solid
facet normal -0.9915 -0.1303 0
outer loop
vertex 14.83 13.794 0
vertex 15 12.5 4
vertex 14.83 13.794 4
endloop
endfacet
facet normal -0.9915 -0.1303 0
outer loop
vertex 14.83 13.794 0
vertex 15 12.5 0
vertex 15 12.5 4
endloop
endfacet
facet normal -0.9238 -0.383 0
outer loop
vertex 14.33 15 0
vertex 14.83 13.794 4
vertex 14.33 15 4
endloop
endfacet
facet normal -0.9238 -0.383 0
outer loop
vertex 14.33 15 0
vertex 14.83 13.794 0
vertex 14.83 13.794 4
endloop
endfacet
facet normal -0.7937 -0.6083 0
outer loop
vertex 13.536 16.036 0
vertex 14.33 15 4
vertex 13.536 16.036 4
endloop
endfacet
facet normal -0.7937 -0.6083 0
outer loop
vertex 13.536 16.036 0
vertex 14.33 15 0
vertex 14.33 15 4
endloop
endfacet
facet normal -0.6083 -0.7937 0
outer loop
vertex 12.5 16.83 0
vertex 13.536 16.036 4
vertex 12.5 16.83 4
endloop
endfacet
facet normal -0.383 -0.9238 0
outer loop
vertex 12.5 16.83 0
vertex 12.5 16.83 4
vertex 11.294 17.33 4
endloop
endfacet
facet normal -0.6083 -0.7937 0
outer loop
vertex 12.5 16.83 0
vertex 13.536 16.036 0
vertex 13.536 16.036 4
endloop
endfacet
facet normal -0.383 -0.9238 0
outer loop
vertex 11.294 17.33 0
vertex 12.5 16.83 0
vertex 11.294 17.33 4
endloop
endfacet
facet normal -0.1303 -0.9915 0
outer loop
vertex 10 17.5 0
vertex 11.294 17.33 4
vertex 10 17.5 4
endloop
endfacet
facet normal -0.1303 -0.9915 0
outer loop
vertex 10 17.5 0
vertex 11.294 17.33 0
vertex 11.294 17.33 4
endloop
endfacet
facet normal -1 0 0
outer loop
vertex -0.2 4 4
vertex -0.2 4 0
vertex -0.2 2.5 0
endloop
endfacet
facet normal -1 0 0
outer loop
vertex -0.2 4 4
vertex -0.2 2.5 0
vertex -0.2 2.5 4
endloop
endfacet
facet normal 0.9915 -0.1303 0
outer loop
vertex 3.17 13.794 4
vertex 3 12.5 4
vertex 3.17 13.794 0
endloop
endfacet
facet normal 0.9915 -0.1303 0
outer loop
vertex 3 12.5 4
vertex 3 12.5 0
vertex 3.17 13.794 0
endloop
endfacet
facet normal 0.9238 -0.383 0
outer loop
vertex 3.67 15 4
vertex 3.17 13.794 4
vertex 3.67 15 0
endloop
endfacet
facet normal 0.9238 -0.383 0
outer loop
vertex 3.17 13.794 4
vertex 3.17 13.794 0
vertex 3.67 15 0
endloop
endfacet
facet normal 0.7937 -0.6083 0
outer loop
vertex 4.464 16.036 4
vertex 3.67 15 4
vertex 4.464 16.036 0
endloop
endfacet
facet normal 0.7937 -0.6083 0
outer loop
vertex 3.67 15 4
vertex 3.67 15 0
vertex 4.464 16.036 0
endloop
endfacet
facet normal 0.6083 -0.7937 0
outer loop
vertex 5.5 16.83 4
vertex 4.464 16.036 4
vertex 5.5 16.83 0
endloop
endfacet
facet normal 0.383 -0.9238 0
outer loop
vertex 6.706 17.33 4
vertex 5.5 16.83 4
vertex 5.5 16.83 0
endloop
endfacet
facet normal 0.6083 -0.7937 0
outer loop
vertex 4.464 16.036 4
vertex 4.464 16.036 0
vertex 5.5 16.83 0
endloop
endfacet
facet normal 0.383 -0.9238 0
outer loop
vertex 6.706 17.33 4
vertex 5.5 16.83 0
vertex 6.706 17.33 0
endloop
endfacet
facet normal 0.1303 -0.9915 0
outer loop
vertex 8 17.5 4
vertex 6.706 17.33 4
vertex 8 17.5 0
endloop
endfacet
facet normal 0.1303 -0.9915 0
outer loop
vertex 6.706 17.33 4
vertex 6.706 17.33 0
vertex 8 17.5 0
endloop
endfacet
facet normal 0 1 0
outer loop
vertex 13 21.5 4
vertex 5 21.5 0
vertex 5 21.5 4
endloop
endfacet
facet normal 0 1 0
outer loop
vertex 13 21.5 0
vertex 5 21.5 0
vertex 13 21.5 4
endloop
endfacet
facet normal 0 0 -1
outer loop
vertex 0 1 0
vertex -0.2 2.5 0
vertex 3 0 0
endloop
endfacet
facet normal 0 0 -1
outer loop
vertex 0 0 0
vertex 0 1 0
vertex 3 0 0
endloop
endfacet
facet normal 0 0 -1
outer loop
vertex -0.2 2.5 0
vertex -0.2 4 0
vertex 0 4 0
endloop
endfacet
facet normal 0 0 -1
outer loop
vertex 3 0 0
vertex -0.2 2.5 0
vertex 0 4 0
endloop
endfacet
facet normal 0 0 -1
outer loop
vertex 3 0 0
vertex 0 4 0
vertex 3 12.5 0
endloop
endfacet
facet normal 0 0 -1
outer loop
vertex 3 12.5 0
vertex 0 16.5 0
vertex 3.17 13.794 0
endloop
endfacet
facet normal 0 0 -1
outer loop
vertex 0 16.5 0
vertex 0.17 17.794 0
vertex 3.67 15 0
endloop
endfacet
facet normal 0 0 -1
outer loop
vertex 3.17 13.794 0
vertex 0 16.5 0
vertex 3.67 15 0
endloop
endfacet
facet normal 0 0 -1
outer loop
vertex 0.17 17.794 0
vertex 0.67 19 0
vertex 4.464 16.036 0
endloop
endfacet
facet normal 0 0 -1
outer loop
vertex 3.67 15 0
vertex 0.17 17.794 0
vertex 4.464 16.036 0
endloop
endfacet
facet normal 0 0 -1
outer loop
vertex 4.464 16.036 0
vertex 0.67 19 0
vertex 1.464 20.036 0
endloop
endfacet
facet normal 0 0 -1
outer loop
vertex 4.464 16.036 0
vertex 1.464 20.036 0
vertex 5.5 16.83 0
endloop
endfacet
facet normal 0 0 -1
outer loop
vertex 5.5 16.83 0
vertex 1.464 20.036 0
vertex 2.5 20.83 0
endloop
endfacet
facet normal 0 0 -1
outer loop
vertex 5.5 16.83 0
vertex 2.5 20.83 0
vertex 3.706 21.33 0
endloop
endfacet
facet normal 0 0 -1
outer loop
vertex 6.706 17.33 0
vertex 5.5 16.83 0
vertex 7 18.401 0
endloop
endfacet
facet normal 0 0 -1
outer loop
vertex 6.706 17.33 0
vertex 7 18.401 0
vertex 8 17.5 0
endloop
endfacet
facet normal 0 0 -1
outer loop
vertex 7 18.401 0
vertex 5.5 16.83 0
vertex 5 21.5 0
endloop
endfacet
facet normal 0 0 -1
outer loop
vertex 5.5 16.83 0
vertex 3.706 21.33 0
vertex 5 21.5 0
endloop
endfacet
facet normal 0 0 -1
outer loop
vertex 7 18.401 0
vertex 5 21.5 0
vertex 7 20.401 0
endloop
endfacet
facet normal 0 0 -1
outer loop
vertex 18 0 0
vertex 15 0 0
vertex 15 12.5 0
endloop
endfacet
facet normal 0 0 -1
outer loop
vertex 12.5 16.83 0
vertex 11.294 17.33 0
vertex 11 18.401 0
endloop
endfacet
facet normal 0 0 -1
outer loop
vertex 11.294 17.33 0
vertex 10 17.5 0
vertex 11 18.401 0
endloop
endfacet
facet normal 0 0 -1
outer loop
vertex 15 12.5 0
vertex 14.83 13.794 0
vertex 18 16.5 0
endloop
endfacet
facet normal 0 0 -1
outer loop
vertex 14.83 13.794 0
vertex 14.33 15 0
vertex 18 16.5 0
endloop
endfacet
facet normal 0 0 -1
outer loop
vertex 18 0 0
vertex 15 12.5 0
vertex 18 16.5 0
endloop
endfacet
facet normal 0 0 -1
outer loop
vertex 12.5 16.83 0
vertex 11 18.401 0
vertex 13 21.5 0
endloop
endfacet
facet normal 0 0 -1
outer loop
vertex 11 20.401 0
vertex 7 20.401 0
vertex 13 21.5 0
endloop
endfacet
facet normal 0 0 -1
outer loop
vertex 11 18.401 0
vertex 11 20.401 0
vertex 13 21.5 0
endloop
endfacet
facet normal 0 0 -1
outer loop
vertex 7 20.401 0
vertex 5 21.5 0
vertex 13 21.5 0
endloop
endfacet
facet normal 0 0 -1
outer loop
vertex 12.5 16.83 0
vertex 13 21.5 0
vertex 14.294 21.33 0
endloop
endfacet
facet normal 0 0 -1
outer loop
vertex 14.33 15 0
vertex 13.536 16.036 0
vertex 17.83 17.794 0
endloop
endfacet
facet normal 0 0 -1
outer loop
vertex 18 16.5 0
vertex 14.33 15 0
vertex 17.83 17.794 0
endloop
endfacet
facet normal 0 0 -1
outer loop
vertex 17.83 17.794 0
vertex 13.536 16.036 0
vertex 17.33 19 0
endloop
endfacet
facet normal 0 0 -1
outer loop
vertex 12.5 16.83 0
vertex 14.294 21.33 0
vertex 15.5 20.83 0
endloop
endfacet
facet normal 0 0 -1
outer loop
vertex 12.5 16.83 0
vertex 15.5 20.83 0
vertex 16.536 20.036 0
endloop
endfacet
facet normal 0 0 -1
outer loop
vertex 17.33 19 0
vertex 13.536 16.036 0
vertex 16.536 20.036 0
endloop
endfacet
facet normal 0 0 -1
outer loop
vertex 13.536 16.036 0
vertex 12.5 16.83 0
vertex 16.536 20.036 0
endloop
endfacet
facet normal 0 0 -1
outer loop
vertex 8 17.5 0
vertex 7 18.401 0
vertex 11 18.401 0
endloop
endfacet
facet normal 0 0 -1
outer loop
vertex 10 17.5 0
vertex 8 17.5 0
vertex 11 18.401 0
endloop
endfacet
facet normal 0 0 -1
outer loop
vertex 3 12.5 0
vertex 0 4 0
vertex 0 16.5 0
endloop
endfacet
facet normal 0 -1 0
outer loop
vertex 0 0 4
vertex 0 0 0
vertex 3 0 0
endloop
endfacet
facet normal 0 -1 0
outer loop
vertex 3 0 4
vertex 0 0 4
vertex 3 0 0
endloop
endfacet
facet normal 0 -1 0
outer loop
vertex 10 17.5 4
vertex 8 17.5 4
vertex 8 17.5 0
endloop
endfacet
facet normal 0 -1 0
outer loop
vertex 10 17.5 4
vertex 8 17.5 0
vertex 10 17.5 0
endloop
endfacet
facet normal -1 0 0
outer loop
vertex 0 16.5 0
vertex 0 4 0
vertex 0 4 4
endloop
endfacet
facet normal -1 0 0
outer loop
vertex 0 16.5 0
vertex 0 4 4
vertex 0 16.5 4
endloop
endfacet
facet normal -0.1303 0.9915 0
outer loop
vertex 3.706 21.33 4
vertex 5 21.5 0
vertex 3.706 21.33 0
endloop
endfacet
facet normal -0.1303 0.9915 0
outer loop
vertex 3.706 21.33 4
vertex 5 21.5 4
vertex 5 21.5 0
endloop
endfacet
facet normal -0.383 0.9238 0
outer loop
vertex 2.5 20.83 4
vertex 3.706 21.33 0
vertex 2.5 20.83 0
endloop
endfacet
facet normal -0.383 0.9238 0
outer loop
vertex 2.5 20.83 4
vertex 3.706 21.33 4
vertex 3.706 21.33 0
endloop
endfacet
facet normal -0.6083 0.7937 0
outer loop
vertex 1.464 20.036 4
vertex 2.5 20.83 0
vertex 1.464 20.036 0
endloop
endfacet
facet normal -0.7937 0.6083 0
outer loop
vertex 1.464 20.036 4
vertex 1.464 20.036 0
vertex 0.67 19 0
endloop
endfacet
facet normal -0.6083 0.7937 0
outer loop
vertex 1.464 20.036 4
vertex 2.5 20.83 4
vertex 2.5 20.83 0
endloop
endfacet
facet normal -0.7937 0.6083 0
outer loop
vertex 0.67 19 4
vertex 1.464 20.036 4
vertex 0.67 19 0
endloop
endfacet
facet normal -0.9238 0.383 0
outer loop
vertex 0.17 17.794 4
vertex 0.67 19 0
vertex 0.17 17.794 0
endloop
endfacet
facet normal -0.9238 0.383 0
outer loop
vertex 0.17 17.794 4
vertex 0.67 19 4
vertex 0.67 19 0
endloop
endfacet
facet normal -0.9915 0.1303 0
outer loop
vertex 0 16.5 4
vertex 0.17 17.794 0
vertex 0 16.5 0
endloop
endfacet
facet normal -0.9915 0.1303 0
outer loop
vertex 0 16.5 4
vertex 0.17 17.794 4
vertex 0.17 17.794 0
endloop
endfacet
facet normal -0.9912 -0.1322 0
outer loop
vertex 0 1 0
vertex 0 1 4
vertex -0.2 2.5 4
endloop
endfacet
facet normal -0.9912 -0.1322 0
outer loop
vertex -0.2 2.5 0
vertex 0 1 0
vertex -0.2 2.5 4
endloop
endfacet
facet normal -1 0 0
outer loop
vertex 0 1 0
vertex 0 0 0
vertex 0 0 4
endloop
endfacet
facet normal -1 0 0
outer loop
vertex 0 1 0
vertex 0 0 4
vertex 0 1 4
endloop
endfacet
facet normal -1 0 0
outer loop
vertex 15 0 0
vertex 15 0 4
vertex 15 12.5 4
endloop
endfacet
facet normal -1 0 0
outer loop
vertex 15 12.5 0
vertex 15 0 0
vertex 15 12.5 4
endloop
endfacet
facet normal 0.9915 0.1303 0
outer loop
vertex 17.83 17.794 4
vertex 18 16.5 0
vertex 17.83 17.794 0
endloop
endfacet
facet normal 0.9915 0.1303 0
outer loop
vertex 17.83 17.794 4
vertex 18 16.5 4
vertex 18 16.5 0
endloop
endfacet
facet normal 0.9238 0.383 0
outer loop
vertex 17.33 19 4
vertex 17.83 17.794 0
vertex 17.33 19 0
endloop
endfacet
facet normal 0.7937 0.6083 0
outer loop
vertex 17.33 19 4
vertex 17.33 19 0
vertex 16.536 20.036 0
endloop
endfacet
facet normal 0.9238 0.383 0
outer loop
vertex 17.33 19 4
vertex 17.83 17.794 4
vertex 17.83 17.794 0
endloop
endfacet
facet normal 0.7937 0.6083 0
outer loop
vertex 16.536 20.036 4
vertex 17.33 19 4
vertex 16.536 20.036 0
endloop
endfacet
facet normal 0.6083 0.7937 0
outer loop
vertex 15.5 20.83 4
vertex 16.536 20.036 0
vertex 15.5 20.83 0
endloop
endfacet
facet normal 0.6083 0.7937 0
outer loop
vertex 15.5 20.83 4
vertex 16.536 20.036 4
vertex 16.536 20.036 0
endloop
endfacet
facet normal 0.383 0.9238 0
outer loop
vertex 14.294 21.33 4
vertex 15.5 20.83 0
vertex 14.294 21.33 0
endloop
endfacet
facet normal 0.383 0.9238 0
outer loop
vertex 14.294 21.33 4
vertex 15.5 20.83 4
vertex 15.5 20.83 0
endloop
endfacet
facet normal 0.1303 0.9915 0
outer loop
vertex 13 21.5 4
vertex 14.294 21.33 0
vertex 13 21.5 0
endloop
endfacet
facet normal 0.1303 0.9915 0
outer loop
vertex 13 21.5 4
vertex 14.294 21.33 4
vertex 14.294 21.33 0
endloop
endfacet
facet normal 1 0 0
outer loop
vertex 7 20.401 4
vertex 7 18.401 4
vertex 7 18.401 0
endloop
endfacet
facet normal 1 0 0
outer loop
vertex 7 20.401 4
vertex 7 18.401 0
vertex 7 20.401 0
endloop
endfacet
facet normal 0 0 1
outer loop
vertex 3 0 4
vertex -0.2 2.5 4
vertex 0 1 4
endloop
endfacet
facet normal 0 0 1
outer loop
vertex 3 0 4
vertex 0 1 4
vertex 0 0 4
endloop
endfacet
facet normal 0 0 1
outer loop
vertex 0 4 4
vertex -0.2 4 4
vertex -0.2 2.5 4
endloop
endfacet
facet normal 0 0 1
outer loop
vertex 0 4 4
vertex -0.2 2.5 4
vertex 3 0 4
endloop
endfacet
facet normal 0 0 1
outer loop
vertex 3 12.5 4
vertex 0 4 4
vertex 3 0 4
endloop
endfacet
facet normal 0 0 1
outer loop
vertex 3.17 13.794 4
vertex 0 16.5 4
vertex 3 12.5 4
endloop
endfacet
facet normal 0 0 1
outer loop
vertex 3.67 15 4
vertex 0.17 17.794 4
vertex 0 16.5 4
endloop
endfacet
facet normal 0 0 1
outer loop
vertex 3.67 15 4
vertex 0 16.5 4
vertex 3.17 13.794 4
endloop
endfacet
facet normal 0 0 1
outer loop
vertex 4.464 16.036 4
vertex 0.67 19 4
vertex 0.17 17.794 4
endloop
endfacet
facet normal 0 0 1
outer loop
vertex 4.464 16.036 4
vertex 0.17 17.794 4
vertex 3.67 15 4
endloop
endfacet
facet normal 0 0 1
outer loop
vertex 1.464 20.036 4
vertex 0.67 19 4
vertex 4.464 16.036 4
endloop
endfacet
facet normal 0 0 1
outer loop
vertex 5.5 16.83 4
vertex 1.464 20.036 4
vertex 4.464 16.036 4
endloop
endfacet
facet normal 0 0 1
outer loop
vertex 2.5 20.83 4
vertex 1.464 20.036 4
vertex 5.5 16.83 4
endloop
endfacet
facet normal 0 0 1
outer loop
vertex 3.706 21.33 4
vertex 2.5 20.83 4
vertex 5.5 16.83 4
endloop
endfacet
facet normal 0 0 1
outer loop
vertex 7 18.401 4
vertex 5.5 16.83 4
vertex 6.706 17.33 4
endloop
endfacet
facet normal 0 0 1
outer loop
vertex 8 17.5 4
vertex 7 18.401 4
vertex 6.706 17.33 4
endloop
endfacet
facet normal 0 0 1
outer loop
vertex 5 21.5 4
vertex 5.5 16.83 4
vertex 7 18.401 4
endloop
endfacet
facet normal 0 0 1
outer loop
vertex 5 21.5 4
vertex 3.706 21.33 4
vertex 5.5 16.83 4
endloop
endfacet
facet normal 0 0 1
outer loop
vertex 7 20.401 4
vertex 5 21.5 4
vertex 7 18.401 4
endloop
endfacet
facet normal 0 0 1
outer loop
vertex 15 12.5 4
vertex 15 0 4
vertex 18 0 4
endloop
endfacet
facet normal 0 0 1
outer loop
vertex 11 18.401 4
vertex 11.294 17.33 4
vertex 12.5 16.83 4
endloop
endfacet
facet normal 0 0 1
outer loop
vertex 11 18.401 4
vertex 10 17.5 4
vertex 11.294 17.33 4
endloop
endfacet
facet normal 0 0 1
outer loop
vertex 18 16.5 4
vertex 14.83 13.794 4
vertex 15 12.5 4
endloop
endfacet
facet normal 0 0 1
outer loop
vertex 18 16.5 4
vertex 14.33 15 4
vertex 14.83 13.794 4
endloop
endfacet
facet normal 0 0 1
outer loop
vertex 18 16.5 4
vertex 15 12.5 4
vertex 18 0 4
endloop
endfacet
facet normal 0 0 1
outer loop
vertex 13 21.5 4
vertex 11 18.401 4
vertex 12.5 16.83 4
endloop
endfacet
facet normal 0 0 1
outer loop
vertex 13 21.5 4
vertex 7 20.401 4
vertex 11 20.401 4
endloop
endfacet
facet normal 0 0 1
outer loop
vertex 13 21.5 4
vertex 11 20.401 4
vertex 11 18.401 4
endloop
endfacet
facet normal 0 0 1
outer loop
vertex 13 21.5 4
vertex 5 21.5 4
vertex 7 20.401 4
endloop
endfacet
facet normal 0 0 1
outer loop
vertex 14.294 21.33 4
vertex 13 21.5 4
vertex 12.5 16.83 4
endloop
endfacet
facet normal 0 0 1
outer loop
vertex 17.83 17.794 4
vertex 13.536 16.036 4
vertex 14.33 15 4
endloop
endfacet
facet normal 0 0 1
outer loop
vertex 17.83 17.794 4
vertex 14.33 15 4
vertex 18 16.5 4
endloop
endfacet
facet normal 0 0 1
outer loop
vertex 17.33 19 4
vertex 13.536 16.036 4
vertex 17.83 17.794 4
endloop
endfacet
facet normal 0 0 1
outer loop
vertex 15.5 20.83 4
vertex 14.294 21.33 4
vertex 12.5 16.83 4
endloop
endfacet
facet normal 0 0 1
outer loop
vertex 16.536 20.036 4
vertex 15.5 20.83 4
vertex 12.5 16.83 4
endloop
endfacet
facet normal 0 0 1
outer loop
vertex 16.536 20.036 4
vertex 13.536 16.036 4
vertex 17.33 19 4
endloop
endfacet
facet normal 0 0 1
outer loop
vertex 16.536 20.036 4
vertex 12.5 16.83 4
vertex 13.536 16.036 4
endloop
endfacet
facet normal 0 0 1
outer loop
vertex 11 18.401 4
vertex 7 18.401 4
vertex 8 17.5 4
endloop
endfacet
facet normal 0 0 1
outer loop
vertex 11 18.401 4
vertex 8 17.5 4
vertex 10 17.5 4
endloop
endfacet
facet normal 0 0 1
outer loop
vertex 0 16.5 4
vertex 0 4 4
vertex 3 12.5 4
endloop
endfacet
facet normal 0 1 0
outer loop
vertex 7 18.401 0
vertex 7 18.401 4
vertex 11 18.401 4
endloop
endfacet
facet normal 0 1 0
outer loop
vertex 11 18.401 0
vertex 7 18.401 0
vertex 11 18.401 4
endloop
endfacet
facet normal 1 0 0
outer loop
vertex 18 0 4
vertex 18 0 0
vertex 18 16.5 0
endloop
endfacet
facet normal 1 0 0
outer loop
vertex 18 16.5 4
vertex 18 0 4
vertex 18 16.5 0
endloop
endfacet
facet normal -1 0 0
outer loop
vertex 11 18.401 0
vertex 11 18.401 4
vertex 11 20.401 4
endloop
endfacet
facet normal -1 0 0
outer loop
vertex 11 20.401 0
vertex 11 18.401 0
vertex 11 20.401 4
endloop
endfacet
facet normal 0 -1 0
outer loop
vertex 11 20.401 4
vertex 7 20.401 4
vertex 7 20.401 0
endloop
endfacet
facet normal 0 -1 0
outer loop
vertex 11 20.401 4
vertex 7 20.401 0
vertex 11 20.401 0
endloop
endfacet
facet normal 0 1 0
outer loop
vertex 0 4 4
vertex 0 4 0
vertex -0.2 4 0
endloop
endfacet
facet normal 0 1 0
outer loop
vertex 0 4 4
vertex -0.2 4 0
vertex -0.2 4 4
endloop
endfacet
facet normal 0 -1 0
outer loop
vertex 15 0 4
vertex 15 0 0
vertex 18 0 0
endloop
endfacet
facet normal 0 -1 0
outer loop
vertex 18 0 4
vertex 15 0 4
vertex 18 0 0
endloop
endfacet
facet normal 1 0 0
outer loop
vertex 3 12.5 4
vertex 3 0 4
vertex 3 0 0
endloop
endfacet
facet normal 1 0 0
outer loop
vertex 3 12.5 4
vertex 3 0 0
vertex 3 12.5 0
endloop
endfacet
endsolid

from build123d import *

# Parameters (mm, degrees)
SKETCH_2_W          = 18
SKETCH_2_H          = 21.5
EXTRUDE_1_DEPTH     = 4
SKETCH_3_W          = 12
SKETCH_3_H          = 17.5
CUT_EXTRUDE_1_DEPTH = 29.324018077
FILLET_1_R          = 5
FILLET_2_R          = 5
SKETCH_4_W          = 4
SKETCH_4_H          = 2
CUT_EXTRUDE_2_DEPTH = 29.324018077
SKETCH_5_W          = 4
SKETCH_5_H          = 3
EXTRUDE_2_DEPTH     = 0.2
CUT_EXTRUDE_3_DEPTH = 29.324018077


with BuildPart() as part:
    # ｽｹｯﾁ2 → ﾎﾞｽ - 押し出し1 (new body)
    with BuildSketch(Plane.XY):
        with Locations((9, 10.75)):
            Rectangle(SKETCH_2_W, SKETCH_2_H)
    extrude(amount=EXTRUDE_1_DEPTH)

    # ｽｹｯﾁ3 → ｶｯﾄ - 押し出し1 (cut, through all)
    with BuildSketch(Plane.XY.offset(4)):
        with Locations((9, 8.75)):
            Rectangle(SKETCH_3_W, SKETCH_3_H)
    extrude(amount=-CUT_EXTRUDE_1_DEPTH, mode=Mode.SUBTRACT)

    # ﾌｨﾚｯﾄ1
    fillet_1_edges = [part.edges().sort_by_distance(p)[0] for p in [
        (3, 17.5, 2),
        (15, 17.5, 2),
    ]]
    fillet(fillet_1_edges, radius=FILLET_1_R)

    # ﾌｨﾚｯﾄ2
    fillet_2_edges = [part.edges().sort_by_distance(p)[0] for p in [
        (0, 21.5, 2),
        (18, 21.5, 2),
    ]]
    fillet(fillet_2_edges, radius=FILLET_2_R)

    # ｽｹｯﾁ4 → ｶｯﾄ - 押し出し2 (cut, through all)
    with BuildSketch(Plane.XY.offset(4)):
        with Locations((9, 19.400947982)):
            Rectangle(SKETCH_4_W, SKETCH_4_H)
    extrude(amount=-CUT_EXTRUDE_2_DEPTH, mode=Mode.SUBTRACT)

    # ｽｹｯﾁ5 → ﾎﾞｽ - 押し出し2 (add)
    with BuildSketch(Plane.ZY):
        with Locations((2, 2.5)):
            Rectangle(SKETCH_5_W, SKETCH_5_H)
    extrude(amount=EXTRUDE_2_DEPTH)

    # ｽｹｯﾁ6 → ｶｯﾄ - 押し出し3 (cut, through all)
    with BuildSketch(Plane.XY.offset(4)):
        Polygon((0, 1), (-0.2, 2.5), (-0.2, 1), align=None)
    extrude(amount=-CUT_EXTRUDE_3_DEPTH, mode=Mode.SUBTRACT)


solid = part.part
